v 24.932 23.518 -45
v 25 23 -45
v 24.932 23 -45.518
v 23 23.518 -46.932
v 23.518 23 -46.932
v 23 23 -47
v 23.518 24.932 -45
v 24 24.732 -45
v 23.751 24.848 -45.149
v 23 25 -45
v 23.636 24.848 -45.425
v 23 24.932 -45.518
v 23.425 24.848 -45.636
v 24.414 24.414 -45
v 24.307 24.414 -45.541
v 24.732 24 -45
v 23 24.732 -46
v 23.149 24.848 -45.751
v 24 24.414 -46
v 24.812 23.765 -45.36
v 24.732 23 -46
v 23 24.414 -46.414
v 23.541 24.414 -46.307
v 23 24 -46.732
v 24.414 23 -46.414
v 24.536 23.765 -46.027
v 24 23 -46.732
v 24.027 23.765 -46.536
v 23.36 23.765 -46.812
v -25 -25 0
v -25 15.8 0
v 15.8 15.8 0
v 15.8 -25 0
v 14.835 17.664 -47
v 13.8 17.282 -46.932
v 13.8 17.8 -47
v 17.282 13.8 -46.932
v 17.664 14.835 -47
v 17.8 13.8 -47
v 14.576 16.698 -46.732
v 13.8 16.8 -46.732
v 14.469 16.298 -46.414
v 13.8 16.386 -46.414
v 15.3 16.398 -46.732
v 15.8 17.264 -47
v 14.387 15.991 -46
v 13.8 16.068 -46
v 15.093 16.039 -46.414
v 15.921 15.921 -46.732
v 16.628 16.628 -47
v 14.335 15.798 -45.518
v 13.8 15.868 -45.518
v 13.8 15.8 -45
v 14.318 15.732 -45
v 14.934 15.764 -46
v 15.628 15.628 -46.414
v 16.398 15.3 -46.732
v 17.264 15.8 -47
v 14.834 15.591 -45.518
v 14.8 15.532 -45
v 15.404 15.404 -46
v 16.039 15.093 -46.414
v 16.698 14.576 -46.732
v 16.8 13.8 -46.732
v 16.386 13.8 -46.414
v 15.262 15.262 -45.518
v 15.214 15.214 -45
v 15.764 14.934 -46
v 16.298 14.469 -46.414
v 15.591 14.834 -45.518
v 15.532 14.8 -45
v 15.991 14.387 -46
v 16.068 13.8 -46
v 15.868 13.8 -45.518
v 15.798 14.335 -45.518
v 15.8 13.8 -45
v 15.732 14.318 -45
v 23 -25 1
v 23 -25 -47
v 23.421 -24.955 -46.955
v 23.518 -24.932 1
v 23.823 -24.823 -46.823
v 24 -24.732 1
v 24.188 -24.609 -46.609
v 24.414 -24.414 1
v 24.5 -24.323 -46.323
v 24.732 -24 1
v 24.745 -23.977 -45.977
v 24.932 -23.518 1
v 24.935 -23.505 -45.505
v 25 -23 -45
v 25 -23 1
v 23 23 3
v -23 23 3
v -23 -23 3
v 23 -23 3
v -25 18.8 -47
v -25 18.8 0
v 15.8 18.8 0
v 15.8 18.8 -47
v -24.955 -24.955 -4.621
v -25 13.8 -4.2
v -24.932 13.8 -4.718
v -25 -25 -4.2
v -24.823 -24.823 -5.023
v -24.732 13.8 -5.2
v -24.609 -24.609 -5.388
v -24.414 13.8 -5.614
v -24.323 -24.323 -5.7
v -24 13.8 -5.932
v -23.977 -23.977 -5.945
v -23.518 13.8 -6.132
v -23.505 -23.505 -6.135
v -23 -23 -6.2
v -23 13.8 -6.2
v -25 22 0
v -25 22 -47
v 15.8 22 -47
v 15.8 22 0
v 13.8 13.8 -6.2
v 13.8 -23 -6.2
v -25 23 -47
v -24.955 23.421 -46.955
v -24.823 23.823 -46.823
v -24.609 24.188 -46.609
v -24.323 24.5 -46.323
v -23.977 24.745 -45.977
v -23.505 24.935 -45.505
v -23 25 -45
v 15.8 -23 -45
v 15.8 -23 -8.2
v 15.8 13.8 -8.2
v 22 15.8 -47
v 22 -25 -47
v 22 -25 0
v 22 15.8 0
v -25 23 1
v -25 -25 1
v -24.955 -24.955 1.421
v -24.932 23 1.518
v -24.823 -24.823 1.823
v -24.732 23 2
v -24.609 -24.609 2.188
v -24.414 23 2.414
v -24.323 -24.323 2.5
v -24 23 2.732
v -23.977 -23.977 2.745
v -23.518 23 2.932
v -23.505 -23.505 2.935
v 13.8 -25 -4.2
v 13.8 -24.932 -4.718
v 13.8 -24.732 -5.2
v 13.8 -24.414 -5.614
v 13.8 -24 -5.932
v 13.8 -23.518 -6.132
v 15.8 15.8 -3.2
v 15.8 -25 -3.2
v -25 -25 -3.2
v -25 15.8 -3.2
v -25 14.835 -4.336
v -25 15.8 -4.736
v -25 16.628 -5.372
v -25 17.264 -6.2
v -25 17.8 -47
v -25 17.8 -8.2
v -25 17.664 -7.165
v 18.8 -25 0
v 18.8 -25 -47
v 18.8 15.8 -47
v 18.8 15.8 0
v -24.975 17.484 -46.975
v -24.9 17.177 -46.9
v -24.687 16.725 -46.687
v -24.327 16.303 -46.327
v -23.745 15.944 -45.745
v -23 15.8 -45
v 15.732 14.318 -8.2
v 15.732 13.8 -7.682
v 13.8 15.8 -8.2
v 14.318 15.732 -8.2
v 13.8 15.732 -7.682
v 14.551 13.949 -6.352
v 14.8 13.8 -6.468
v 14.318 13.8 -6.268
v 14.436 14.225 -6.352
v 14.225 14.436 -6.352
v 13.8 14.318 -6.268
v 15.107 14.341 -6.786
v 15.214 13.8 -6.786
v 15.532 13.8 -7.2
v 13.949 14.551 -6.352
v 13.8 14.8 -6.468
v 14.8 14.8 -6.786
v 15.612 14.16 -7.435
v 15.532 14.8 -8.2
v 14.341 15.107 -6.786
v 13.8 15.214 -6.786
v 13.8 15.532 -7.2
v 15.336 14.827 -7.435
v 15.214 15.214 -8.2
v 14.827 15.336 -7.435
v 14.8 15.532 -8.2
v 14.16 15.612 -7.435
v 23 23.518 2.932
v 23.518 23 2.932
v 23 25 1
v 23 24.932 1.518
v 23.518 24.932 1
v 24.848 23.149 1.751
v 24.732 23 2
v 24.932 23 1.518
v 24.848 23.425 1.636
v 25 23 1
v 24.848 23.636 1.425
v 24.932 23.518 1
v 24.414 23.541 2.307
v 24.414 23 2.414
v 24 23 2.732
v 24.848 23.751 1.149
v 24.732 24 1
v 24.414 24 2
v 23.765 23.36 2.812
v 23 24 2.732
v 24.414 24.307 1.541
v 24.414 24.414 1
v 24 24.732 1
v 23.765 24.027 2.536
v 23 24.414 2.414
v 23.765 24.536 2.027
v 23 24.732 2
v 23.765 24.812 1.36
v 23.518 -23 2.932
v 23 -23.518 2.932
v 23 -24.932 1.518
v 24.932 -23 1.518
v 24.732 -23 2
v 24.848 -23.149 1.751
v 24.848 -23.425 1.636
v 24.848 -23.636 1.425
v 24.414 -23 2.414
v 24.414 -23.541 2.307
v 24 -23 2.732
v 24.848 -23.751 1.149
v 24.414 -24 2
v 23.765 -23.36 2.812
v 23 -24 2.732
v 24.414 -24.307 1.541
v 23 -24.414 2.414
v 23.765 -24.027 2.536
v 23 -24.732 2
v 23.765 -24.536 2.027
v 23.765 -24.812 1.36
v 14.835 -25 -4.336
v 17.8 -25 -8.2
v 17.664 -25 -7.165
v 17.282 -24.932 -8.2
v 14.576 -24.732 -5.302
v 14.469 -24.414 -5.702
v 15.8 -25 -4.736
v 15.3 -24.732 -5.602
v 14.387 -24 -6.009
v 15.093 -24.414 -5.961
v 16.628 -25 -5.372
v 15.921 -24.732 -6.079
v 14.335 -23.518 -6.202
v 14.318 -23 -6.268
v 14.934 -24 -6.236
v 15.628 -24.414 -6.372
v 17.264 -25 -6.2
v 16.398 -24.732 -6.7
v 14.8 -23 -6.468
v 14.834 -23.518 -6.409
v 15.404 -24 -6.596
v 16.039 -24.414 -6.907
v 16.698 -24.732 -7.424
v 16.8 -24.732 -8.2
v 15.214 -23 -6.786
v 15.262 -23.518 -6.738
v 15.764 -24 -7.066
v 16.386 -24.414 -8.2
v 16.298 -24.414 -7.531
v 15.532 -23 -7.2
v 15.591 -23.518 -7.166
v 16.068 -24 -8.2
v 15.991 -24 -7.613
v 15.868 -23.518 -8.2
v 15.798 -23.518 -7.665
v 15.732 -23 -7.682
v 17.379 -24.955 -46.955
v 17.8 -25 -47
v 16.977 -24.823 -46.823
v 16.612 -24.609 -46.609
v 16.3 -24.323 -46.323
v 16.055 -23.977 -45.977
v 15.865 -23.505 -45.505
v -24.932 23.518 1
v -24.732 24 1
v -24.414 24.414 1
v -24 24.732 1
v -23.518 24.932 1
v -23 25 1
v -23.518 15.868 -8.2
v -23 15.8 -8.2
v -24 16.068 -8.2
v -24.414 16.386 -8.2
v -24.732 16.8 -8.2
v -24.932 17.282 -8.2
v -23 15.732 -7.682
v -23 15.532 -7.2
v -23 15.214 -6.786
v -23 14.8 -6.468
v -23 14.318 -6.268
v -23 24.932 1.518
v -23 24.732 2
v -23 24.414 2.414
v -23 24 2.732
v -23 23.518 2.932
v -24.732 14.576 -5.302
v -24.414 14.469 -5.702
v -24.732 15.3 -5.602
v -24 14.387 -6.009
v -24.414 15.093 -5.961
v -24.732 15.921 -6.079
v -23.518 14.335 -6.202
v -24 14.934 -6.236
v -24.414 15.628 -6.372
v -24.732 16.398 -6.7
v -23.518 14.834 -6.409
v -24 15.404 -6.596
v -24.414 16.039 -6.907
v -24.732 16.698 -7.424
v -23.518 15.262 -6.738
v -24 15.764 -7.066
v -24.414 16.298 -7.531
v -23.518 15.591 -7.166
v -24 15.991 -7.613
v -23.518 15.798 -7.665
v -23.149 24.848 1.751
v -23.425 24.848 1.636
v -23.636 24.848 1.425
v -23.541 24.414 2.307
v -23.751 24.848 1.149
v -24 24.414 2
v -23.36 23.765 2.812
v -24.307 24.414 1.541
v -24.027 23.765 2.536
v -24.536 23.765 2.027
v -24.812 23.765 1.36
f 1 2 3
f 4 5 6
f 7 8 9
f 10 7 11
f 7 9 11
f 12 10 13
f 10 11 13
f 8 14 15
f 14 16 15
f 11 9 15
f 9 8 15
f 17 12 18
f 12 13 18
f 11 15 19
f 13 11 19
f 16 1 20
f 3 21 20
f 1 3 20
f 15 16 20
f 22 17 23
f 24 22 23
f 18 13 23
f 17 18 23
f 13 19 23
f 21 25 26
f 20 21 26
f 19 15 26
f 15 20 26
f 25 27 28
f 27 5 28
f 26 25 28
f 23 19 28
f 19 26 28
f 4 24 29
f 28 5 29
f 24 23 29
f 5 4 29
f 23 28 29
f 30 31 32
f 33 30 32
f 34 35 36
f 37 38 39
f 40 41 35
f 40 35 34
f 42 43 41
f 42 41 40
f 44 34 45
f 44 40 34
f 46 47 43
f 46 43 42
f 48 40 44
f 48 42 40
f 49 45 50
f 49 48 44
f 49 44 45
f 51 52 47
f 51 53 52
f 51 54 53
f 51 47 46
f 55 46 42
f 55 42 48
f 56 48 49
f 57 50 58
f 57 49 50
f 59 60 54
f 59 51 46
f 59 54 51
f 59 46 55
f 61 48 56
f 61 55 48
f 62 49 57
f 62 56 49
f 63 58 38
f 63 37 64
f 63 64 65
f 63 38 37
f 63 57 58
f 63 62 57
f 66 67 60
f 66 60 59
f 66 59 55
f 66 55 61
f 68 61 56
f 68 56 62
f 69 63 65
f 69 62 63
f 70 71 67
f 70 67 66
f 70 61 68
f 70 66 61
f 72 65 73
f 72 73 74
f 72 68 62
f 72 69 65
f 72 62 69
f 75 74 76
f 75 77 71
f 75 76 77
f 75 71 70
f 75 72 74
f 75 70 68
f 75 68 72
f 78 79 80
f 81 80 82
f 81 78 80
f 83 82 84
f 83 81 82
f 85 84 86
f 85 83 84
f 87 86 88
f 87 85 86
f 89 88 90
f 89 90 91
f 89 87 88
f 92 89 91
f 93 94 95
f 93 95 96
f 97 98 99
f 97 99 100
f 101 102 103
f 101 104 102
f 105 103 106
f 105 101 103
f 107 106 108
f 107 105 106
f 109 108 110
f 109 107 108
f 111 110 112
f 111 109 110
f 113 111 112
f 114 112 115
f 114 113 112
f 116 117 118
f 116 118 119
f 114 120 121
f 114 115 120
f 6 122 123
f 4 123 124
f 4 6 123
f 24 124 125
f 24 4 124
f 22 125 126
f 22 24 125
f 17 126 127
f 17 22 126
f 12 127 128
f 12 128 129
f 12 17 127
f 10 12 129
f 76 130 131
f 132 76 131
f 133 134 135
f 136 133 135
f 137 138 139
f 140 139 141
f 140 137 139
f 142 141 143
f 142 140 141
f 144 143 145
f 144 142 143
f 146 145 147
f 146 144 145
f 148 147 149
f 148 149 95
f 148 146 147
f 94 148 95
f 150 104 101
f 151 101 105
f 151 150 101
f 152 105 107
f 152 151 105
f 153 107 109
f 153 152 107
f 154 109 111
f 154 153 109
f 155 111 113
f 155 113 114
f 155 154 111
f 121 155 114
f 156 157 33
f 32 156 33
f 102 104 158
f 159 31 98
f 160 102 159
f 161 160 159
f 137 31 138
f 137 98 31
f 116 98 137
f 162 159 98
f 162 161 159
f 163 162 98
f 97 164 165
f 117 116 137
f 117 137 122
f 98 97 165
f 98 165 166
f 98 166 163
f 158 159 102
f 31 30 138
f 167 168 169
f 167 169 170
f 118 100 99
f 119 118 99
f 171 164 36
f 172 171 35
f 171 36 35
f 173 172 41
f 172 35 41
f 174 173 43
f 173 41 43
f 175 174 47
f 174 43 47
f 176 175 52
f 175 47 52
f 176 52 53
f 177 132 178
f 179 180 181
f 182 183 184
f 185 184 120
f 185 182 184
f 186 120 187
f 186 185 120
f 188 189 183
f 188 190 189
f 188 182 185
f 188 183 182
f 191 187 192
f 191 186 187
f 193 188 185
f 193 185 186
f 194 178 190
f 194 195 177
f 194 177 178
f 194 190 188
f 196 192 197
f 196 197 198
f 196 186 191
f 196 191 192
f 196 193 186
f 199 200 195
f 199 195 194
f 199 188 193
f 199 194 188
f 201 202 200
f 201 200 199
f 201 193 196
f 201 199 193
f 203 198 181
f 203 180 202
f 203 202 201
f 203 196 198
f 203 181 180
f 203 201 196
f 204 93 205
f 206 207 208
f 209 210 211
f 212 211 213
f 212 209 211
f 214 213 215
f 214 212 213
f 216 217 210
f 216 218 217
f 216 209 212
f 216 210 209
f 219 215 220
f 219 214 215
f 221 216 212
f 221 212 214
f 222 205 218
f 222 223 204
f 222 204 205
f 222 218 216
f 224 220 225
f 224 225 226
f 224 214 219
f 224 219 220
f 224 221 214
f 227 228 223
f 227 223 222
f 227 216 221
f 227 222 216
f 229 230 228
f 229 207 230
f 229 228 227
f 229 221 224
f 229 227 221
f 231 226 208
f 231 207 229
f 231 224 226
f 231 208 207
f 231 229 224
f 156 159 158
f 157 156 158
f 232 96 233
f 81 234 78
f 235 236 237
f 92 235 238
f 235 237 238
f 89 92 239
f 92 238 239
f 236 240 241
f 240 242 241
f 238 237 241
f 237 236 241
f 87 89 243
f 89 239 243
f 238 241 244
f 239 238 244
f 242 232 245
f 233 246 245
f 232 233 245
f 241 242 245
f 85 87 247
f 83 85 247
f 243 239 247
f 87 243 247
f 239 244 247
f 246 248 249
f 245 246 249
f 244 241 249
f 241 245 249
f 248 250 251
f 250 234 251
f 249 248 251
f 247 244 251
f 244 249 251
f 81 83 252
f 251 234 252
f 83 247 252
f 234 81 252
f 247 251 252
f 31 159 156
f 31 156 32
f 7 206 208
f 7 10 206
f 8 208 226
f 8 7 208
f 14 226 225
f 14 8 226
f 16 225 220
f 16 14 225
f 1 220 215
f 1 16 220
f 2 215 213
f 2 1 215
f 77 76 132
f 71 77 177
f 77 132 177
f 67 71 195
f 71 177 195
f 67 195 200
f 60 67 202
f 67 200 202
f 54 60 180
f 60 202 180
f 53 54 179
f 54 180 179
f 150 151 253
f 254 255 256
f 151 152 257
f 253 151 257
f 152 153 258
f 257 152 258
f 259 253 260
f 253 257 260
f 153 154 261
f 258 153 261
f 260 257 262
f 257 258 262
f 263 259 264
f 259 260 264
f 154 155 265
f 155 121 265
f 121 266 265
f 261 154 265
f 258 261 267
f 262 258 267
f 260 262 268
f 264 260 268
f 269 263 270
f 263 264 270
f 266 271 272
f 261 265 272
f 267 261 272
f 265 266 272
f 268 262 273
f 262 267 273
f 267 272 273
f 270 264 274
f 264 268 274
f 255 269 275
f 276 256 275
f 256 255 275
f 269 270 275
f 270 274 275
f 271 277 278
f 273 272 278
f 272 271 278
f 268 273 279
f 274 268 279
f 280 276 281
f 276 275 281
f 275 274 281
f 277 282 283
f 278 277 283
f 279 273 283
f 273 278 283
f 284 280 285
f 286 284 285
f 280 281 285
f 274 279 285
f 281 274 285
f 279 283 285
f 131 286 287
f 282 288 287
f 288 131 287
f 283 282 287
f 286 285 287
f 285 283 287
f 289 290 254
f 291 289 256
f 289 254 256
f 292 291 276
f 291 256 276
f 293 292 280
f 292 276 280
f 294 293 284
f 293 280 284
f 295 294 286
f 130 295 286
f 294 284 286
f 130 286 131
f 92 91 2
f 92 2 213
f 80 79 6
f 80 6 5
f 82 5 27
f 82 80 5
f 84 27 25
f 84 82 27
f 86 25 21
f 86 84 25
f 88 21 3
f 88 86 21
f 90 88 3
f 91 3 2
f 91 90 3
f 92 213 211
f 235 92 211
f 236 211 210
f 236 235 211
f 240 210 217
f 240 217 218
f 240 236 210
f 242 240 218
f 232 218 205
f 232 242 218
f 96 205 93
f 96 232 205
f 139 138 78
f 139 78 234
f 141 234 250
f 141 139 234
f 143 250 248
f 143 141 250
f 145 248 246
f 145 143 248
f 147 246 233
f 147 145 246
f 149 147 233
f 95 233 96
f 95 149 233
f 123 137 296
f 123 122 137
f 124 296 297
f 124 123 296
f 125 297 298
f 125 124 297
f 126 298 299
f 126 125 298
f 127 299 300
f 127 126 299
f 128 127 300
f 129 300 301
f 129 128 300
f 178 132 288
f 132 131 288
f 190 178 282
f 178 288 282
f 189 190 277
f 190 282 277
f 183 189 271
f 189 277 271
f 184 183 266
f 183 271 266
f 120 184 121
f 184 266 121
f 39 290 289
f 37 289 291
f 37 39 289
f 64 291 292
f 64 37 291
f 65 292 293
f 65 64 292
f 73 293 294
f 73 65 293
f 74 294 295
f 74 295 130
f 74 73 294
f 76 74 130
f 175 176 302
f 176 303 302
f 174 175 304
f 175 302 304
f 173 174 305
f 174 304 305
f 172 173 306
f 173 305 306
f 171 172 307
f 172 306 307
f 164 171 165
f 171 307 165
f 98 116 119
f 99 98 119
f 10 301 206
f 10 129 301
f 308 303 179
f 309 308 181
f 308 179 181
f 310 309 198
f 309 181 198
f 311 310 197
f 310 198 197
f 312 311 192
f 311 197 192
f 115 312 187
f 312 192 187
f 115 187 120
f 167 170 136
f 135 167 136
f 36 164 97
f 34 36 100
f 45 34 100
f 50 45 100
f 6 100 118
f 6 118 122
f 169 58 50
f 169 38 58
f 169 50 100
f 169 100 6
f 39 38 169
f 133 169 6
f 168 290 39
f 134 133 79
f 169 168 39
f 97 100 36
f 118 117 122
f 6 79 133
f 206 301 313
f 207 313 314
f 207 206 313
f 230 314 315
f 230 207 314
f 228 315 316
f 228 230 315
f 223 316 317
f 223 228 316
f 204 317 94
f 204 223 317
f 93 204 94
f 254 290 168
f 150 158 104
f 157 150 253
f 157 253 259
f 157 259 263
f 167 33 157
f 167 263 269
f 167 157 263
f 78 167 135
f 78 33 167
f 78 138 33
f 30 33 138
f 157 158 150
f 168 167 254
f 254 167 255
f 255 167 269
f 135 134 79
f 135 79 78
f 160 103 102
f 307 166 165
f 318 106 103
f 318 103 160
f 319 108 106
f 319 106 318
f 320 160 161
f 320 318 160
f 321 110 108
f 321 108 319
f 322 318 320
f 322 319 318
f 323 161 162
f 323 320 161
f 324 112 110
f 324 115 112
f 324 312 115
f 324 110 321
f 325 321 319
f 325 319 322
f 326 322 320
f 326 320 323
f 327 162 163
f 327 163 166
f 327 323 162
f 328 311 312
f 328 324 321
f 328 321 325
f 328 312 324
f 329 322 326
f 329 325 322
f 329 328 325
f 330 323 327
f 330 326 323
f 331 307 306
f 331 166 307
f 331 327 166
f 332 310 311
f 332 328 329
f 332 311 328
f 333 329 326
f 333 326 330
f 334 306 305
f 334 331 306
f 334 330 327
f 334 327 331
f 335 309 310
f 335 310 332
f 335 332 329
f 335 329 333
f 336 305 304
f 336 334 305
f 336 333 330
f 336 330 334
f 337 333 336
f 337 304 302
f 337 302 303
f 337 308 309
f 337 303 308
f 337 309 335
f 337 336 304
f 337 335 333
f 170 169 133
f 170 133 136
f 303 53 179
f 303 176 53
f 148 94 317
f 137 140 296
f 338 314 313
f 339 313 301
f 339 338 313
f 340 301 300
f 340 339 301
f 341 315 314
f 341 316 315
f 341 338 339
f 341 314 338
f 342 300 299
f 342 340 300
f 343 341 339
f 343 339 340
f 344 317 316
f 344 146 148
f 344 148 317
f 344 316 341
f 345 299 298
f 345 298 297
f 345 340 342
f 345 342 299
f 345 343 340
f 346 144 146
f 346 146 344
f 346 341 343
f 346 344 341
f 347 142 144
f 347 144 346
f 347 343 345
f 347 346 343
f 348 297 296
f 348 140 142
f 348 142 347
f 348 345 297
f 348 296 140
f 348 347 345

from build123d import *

# Parameters (mm, degrees)
F0_W      = 50
F0_H      = 50
F1_DEPTH  = 3
F2_W      = 3
F2_H      = 3
F2_H_2    = 47
F3_DEPTH  = 50
F4_W      = 3
F4_H      = 50
F5_DEPTH  = 47
F6_DEPTH  = 3
F7_W      = 3.2
F7_H      = 3.2
F8_DEPTH  = 50
F9_W      = 40.8
F9_H      = 3
F10_DEPTH = 40.8
F11_R     = 2


with BuildPart() as f1:
    # F0 (on Top) → F1 (new body)
    with BuildSketch(Plane.XY):
        Rectangle(F0_W, F0_H)
    extrude(amount=F1_DEPTH)

    # F2 (on face) → F3 (join, through all)
    with BuildSketch(Plane(origin=(-25, 0, 0), x_dir=(0, -1, 0), z_dir=(-1, 0, 0))):
        with Locations((-23.5, 1.5)):
            Rectangle(F2_W, F2_H)
        with Locations((-17.3, 1.5)):
            Rectangle(F2_W, F2_H)
        with Locations((-17.3, -23.5)):
            Rectangle(F2_W, F2_H_2)
        with Locations((-23.5, -23.5)):
            Rectangle(F2_W, F2_H_2)
    extrude(amount=-F3_DEPTH)

    # F4 (on face) → F5 (join, through all)
    with BuildSketch(Plane.XZ.offset(25)):
        with Locations((23.5, -22)):
            Rectangle(F4_W, F4_H)
        with Locations((17.3, -22)):
            Rectangle(F4_W, F4_H)
    extrude(amount=-F5_DEPTH)

    # F6 (add, through all): a face of the model
    f6_faces = [f1.faces().sort_by_distance(p)[0] for p in [
        (20.4, 20.4, 0),
    ]]
    extrude(f6_faces, amount=-F6_DEPTH)

    # F7 (on face) → F8 (join, through all)
    with BuildSketch(Plane(origin=(0, 0, -47), x_dir=(1, 0, 0), z_dir=(0, 0, -1))):
        with Locations((20.4, -20.4)):
            Rectangle(F7_W, F7_H)
    extrude(amount=-F8_DEPTH)

    # F9 (on face) → F10 (join, through all)
    with BuildSketch(Plane(origin=(-25, 0, 0), x_dir=(0, -1, 0), z_dir=(-1, 0, 0))):
        with Locations((4.6, -4.7)):
            Rectangle(F9_W, F9_H)
    extrude(amount=-F10_DEPTH)

    # F11
    f11_edges = [f1.edges().sort_by_distance(p)[0] for p in [
        (-25, 0, 3),
        (0, -25, 3),
        (0, 25, 3),
        (25, 0, 3),
        (25, 0, -47),
        (25, -25, -22),
        (25, 25, -22),
        (-25, 25, -22),
        (0, 25, -47),
        (15.8, -25, -26.6),
        (15.8, -4.6, -47),
        (15.8, 15.8, -26.6),
        (15.8, -4.6, -6.2),
        (-25, 15.8, -26.6),
        (-4.6, 15.8, -6.2),
        (-4.6, 15.8, -47),
        (-4.6, -25, -6.2),
        (-25, -4.6, -6.2),
    ]]
    fillet(f11_edges, radius=F11_R)


solid = f1.part
